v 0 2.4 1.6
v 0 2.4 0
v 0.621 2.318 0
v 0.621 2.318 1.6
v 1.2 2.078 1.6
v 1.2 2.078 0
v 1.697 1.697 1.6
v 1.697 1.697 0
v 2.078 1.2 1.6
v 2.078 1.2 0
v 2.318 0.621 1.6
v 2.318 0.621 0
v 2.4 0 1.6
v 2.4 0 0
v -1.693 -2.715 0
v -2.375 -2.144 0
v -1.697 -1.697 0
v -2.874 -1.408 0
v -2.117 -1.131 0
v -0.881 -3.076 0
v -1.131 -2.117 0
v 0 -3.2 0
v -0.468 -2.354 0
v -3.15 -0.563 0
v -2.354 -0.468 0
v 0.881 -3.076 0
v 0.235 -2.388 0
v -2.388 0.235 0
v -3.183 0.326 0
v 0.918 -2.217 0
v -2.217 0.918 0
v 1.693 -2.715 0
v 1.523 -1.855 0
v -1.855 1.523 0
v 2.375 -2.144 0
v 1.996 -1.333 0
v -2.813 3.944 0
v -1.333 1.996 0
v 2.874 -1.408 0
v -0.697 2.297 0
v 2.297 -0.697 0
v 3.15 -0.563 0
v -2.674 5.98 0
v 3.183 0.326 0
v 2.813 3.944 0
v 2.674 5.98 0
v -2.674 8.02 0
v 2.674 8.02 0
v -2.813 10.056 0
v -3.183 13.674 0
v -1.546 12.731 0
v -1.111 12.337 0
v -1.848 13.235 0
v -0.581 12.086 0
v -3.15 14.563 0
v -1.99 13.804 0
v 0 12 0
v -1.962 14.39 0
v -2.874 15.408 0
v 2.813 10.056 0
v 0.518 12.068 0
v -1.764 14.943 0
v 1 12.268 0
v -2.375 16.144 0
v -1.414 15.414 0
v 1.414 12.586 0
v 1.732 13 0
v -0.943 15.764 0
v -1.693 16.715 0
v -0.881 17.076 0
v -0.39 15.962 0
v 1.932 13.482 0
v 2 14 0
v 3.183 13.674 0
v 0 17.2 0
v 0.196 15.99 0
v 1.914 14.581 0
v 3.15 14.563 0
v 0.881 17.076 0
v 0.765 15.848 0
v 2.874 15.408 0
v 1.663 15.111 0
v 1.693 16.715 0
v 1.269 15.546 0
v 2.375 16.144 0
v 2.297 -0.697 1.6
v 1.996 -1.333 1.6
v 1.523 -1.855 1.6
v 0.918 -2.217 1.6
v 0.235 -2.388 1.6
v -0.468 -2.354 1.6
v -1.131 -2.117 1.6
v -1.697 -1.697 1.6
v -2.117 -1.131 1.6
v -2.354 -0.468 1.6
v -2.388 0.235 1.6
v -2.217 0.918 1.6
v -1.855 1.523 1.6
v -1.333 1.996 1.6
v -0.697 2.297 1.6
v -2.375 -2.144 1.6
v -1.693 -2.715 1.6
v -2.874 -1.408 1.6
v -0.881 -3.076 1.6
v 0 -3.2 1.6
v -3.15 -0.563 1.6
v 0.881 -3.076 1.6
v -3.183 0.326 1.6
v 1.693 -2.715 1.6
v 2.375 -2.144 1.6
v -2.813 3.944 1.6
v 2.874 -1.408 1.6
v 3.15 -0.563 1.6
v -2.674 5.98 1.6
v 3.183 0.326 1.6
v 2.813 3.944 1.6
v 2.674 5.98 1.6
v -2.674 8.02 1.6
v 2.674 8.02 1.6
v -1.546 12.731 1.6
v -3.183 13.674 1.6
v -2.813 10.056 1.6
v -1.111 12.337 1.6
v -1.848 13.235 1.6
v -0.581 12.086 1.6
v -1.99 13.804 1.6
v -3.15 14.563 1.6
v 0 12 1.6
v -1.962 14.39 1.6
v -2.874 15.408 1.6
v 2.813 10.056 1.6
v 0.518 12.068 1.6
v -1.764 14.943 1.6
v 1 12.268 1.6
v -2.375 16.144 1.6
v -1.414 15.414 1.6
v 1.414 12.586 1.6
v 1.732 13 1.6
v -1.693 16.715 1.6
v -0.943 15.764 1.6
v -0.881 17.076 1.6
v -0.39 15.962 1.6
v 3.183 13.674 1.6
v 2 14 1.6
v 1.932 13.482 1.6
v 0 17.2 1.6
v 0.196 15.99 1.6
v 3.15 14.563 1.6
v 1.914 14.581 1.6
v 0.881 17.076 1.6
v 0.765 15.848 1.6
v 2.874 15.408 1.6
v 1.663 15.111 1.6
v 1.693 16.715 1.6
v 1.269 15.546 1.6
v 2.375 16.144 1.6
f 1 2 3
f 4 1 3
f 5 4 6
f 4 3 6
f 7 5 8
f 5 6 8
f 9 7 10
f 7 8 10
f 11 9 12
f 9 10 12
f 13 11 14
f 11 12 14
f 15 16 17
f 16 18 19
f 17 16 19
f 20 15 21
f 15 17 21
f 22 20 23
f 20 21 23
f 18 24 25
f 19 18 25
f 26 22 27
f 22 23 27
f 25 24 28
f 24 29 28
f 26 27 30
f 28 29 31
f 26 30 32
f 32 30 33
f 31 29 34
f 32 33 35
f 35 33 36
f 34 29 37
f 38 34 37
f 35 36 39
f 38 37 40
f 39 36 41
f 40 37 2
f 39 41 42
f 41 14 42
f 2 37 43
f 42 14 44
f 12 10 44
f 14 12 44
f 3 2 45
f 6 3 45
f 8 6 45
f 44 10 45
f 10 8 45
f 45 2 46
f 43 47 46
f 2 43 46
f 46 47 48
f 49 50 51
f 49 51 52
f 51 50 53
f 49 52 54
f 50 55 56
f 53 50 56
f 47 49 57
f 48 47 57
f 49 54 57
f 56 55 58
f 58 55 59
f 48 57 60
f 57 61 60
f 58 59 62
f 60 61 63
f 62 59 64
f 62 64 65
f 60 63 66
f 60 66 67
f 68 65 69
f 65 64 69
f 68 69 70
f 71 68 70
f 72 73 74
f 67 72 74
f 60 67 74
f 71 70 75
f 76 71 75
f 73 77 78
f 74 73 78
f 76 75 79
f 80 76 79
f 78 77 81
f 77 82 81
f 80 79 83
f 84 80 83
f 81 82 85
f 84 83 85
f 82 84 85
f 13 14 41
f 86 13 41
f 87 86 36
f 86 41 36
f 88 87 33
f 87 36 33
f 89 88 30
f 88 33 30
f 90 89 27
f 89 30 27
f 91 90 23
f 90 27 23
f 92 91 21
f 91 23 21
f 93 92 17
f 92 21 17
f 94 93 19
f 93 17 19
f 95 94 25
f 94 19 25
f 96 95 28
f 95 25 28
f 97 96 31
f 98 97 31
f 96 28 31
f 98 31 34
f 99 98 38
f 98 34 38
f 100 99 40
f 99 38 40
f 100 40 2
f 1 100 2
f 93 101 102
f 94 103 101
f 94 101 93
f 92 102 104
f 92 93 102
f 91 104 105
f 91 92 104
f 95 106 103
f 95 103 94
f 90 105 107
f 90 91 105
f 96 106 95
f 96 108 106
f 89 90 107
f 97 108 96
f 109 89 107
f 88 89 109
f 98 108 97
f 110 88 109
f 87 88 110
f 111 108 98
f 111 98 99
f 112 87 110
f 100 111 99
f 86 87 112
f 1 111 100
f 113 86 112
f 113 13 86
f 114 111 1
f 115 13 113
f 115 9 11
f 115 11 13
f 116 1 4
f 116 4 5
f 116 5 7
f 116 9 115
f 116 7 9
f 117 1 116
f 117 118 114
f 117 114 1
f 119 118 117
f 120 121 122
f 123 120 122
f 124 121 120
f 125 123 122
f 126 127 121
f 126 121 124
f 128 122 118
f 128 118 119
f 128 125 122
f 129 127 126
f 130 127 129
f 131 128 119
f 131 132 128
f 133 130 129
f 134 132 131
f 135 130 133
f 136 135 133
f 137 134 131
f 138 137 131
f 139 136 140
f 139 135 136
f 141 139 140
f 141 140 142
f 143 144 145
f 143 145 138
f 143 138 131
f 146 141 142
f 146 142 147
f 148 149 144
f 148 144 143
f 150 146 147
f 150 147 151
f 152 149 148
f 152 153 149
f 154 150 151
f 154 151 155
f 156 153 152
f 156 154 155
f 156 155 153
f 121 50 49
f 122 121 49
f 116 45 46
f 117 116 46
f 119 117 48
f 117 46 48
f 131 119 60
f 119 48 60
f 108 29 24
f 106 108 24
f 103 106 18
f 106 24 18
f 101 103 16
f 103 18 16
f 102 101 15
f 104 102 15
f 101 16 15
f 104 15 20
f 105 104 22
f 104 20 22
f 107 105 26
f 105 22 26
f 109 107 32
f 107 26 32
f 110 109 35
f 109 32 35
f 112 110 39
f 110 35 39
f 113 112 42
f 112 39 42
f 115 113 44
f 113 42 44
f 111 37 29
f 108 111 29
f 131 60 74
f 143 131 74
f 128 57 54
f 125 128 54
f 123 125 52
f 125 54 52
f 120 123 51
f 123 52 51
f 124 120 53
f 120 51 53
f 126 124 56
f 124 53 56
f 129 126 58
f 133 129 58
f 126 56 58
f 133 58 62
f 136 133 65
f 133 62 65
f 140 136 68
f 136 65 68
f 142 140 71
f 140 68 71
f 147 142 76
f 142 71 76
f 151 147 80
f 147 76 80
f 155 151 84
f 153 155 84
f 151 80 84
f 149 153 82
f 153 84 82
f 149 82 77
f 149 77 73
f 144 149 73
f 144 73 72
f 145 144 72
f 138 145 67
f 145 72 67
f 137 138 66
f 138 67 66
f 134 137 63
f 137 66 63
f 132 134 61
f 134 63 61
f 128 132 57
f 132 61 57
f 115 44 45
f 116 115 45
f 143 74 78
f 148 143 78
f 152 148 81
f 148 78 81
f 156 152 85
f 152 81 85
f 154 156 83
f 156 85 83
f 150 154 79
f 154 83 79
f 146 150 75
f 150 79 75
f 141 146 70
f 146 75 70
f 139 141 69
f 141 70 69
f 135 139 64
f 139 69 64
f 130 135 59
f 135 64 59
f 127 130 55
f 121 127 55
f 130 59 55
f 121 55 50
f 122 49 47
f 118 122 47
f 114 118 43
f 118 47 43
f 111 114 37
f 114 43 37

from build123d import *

# Parameters (mm, degrees)
F1_DEPTH = 1.6


with BuildPart() as f1:
    # F0 (on Top) → F1 (new body)
    with BuildSketch(Plane.XY):
        with BuildLine():
            ThreePointArc((0, 2.4), (-1.697056, -1.697056), (2.4, 0))
            ThreePointArc((2.4, 0), (1.697056, 1.697056), (0, 2.4))
        make_face()
        with BuildLine():
            ThreePointArc((2, 14), (-1.414214, 15.414214), (0, 12))
            ThreePointArc((0, 12), (1.414214, 12.585786), (2, 14))
        make_face()
        with BuildLine():
            Line((-2.812876, 3.944275), (-3.183357, 0.325944))
            ThreePointArc((-3.183357, 0.325944), (0, -3.2), (3.183357, 0.325944))
            Line((3.183357, 0.325944), (2.812876, 3.944275))
            ThreePointArc((2.812876, 3.944275), (2.656846, 7), (2.812876, 10.055725))
            Line((2.812876, 10.055725), (3.183357, 13.674056))
            ThreePointArc((3.183357, 13.674056), (0, 17.2), (-3.183357, 13.674056))
            Line((-3.183357, 13.674056), (-2.812876, 10.055725))
            ThreePointArc((-2.812876, 10.055725), (-2.656846, 7), (-2.812876, 3.944275))
        make_face()
        with BuildLine():
            ThreePointArc((0, 2.4), (1.697056, 1.697056), (2.4, 0))
            ThreePointArc((2.4, 0), (-1.697056, -1.697056), (0, 2.4))
        make_face(mode=Mode.SUBTRACT)
        with BuildLine():
            ThreePointArc((2, 14), (1.414214, 12.585786), (0, 12))
            ThreePointArc((0, 12), (-1.414214, 15.414214), (2, 14))
        make_face(mode=Mode.SUBTRACT)
    extrude(amount=F1_DEPTH)


solid = f1.part
